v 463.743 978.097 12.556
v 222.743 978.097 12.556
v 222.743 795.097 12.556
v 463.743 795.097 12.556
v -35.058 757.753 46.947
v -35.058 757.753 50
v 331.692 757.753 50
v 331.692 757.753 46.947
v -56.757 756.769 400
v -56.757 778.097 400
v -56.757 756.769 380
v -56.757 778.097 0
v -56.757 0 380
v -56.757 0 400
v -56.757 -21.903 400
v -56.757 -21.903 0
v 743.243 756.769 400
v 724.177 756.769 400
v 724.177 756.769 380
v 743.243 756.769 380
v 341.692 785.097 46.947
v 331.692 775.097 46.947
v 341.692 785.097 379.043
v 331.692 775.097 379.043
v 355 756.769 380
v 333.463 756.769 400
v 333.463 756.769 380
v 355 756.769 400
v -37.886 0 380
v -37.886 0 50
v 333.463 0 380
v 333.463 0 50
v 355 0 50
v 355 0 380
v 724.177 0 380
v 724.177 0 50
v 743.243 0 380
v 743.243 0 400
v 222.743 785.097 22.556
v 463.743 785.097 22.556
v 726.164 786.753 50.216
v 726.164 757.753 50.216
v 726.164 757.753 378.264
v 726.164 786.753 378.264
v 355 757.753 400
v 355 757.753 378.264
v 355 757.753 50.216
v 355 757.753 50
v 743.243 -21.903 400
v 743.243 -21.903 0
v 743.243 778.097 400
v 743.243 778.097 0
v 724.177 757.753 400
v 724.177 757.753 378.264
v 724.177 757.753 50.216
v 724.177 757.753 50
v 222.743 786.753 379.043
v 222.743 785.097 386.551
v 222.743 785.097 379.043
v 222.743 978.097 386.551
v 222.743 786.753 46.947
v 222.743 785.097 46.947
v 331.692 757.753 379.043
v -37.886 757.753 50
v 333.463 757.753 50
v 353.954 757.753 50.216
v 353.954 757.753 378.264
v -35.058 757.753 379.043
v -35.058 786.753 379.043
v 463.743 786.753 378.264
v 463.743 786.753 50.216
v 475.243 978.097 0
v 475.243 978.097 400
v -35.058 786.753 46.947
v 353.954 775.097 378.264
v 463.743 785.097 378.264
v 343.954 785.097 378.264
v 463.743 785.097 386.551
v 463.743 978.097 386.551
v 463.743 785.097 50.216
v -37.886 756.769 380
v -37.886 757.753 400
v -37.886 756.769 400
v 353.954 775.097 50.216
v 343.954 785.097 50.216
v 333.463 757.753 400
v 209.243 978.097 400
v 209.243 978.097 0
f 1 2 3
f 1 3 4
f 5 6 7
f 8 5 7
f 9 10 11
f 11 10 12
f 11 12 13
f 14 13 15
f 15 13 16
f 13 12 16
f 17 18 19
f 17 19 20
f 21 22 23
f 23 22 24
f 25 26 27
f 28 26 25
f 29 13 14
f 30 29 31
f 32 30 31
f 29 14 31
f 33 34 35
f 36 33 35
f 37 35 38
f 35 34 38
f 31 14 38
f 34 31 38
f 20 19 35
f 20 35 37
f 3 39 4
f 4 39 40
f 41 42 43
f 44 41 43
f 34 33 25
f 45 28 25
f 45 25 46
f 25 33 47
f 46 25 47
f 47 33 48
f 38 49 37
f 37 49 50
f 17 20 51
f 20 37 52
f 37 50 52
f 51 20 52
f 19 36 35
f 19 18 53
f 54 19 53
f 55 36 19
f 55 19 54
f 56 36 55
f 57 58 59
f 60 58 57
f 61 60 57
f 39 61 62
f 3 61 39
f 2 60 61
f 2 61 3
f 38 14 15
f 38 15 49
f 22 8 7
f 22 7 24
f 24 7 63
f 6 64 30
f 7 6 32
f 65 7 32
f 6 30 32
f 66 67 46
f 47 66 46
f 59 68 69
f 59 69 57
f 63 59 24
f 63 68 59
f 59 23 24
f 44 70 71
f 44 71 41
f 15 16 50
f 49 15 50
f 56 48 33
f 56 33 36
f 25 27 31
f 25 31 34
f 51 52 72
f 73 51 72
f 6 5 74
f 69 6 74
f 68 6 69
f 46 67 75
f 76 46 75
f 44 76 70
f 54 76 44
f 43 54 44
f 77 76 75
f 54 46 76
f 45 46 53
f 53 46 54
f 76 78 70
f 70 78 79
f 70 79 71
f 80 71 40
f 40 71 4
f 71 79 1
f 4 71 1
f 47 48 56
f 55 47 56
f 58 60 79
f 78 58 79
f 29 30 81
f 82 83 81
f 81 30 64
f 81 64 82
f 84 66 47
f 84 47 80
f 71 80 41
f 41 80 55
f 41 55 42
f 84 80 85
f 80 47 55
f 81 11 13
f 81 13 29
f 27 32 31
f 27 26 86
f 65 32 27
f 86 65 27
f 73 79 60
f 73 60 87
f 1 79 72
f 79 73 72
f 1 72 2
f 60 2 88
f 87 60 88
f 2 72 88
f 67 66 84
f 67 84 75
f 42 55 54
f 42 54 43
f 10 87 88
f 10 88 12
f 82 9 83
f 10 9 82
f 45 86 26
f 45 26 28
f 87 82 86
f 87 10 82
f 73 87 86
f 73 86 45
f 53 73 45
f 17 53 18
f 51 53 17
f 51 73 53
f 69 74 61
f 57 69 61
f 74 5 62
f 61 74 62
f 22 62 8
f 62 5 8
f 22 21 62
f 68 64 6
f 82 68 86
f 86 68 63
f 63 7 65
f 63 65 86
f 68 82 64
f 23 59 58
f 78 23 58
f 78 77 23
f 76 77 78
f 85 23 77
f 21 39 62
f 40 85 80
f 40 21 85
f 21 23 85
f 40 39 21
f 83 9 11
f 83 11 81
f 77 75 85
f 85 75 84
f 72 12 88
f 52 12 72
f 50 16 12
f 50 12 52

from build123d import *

# Parameters (mm, degrees)
SKETCH1_W           = 371.348752766
SKETCH1_H           = 757.75300928
SKETCH1_W_2         = 369.177102164
BOSS_EXTRUDE2_DEPTH = 400
SKETCH2_W           = 762.063158907
SKETCH2_H           = 50
BOSS_EXTRUDE3_DEPTH = 761
SKETCH3_W           = 800
SKETCH3_H           = 756.769192836
CUT_EXTRUDE1_DEPTH  = 20
SKETCH4_W           = 240.999510027
SKETCH4_H           = 373.99553593
CUT_EXTRUDE2_DEPTH  = 164
SKETCH5_W           = 366.749799027
SKETCH5_H           = 332.09627471
CUT_EXTRUDE4_DEPTH  = 29
SKETCH6_W           = 240.999510027
SKETCH6_H           = 373.99553593
CUT_EXTRUDE5_DEPTH  = 29
SKETCH7_W           = 372.210354375
SKETCH7_H           = 328.047679772
CUT_EXTRUDE7_DEPTH  = 29
CHAMFER2_SIZE       = 10


with BuildPart() as part:
    # Sketch1 → Boss-Extrude2 (new body)
    with BuildSketch(Plane.XY):
        Polygon((-56.757111626, 778.097101449), (-56.757111626, -21.902898551), (743.242888374, -21.902898551), (743.242888374, 778.097101449), (475.242888374, 978.097101449), (209.242888374, 978.097101449), align=None)
        with Locations((147.788525051, 378.87650464)):
            Rectangle(SKETCH1_W, SKETCH1_H, mode=Mode.SUBTRACT)
        with Locations((539.588756493, 378.87650464)):
            Rectangle(SKETCH1_W_2, SKETCH1_H, mode=Mode.SUBTRACT)
    extrude(amount=BOSS_EXTRUDE2_DEPTH)

    # Sketch2 → Boss-Extrude3 (add)
    with BuildSketch(Plane(origin=(0, 0, 0), x_dir=(1, 0, 0), z_dir=(0, 1, 0))):
        with Locations((343.145728122, -25)):
            Rectangle(SKETCH2_W, SKETCH2_H)
    extrude(amount=BOSS_EXTRUDE3_DEPTH)

    # Sketch3 → Cut-Extrude1 (cut)
    with BuildSketch(Plane.XY.offset(400)):
        with Locations((343.242888374, 378.384596418)):
            Rectangle(SKETCH3_W, SKETCH3_H)
    extrude(amount=-CUT_EXTRUDE1_DEPTH, mode=Mode.SUBTRACT)

    # Sketch4 → Cut-Extrude2 (cut)
    with BuildSketch(Plane(origin=(0, 978.097101449, 0), x_dir=(1, 0, 0), z_dir=(0, 1, 0))):
        with Locations((343.242888374, -199.553704611)):
            Rectangle(SKETCH4_W, SKETCH4_H)
    extrude(amount=-CUT_EXTRUDE2_DEPTH, mode=Mode.SUBTRACT)

    # Sketch5 → Cut-Extrude4 (cut)
    with BuildSketch(Plane.XZ.offset(-757.75300928)):
        with Locations((148.316814088, 212.995071619)):
            Rectangle(SKETCH5_W, SKETCH5_H)
    extrude(amount=-CUT_EXTRUDE4_DEPTH, mode=Mode.SUBTRACT)

    # Sketch6 → Cut-Extrude5 (cut)
    with BuildSketch(Plane(origin=(0, 814.097101449, 0), x_dir=(1, 0, 0), z_dir=(0, 1, 0))):
        with Locations((343.242888374, -199.553704611)):
            Rectangle(SKETCH6_W, SKETCH6_H)
    extrude(amount=-CUT_EXTRUDE5_DEPTH, mode=Mode.SUBTRACT)

    # Sketch7 → Cut-Extrude7 (cut)
    with BuildSketch(Plane.XZ.offset(-757.75300928)):
        with Locations((540.059154896, 214.239949558)):
            Rectangle(SKETCH7_W, SKETCH7_H)
    extrude(amount=-CUT_EXTRUDE7_DEPTH, mode=Mode.SUBTRACT)

    # Chamfer2
    chamfer2_edges = [part.edges().sort_by_distance(p)[0] for p in [
        (343.242888374, 785.097101449, 12.555936646),
        (331.691713601, 785.097101449, 212.995071619),
        (353.953977708, 785.097101449, 214.239949558),
    ]]
    chamfer(chamfer2_edges, length=CHAMFER2_SIZE)


solid = part.part
